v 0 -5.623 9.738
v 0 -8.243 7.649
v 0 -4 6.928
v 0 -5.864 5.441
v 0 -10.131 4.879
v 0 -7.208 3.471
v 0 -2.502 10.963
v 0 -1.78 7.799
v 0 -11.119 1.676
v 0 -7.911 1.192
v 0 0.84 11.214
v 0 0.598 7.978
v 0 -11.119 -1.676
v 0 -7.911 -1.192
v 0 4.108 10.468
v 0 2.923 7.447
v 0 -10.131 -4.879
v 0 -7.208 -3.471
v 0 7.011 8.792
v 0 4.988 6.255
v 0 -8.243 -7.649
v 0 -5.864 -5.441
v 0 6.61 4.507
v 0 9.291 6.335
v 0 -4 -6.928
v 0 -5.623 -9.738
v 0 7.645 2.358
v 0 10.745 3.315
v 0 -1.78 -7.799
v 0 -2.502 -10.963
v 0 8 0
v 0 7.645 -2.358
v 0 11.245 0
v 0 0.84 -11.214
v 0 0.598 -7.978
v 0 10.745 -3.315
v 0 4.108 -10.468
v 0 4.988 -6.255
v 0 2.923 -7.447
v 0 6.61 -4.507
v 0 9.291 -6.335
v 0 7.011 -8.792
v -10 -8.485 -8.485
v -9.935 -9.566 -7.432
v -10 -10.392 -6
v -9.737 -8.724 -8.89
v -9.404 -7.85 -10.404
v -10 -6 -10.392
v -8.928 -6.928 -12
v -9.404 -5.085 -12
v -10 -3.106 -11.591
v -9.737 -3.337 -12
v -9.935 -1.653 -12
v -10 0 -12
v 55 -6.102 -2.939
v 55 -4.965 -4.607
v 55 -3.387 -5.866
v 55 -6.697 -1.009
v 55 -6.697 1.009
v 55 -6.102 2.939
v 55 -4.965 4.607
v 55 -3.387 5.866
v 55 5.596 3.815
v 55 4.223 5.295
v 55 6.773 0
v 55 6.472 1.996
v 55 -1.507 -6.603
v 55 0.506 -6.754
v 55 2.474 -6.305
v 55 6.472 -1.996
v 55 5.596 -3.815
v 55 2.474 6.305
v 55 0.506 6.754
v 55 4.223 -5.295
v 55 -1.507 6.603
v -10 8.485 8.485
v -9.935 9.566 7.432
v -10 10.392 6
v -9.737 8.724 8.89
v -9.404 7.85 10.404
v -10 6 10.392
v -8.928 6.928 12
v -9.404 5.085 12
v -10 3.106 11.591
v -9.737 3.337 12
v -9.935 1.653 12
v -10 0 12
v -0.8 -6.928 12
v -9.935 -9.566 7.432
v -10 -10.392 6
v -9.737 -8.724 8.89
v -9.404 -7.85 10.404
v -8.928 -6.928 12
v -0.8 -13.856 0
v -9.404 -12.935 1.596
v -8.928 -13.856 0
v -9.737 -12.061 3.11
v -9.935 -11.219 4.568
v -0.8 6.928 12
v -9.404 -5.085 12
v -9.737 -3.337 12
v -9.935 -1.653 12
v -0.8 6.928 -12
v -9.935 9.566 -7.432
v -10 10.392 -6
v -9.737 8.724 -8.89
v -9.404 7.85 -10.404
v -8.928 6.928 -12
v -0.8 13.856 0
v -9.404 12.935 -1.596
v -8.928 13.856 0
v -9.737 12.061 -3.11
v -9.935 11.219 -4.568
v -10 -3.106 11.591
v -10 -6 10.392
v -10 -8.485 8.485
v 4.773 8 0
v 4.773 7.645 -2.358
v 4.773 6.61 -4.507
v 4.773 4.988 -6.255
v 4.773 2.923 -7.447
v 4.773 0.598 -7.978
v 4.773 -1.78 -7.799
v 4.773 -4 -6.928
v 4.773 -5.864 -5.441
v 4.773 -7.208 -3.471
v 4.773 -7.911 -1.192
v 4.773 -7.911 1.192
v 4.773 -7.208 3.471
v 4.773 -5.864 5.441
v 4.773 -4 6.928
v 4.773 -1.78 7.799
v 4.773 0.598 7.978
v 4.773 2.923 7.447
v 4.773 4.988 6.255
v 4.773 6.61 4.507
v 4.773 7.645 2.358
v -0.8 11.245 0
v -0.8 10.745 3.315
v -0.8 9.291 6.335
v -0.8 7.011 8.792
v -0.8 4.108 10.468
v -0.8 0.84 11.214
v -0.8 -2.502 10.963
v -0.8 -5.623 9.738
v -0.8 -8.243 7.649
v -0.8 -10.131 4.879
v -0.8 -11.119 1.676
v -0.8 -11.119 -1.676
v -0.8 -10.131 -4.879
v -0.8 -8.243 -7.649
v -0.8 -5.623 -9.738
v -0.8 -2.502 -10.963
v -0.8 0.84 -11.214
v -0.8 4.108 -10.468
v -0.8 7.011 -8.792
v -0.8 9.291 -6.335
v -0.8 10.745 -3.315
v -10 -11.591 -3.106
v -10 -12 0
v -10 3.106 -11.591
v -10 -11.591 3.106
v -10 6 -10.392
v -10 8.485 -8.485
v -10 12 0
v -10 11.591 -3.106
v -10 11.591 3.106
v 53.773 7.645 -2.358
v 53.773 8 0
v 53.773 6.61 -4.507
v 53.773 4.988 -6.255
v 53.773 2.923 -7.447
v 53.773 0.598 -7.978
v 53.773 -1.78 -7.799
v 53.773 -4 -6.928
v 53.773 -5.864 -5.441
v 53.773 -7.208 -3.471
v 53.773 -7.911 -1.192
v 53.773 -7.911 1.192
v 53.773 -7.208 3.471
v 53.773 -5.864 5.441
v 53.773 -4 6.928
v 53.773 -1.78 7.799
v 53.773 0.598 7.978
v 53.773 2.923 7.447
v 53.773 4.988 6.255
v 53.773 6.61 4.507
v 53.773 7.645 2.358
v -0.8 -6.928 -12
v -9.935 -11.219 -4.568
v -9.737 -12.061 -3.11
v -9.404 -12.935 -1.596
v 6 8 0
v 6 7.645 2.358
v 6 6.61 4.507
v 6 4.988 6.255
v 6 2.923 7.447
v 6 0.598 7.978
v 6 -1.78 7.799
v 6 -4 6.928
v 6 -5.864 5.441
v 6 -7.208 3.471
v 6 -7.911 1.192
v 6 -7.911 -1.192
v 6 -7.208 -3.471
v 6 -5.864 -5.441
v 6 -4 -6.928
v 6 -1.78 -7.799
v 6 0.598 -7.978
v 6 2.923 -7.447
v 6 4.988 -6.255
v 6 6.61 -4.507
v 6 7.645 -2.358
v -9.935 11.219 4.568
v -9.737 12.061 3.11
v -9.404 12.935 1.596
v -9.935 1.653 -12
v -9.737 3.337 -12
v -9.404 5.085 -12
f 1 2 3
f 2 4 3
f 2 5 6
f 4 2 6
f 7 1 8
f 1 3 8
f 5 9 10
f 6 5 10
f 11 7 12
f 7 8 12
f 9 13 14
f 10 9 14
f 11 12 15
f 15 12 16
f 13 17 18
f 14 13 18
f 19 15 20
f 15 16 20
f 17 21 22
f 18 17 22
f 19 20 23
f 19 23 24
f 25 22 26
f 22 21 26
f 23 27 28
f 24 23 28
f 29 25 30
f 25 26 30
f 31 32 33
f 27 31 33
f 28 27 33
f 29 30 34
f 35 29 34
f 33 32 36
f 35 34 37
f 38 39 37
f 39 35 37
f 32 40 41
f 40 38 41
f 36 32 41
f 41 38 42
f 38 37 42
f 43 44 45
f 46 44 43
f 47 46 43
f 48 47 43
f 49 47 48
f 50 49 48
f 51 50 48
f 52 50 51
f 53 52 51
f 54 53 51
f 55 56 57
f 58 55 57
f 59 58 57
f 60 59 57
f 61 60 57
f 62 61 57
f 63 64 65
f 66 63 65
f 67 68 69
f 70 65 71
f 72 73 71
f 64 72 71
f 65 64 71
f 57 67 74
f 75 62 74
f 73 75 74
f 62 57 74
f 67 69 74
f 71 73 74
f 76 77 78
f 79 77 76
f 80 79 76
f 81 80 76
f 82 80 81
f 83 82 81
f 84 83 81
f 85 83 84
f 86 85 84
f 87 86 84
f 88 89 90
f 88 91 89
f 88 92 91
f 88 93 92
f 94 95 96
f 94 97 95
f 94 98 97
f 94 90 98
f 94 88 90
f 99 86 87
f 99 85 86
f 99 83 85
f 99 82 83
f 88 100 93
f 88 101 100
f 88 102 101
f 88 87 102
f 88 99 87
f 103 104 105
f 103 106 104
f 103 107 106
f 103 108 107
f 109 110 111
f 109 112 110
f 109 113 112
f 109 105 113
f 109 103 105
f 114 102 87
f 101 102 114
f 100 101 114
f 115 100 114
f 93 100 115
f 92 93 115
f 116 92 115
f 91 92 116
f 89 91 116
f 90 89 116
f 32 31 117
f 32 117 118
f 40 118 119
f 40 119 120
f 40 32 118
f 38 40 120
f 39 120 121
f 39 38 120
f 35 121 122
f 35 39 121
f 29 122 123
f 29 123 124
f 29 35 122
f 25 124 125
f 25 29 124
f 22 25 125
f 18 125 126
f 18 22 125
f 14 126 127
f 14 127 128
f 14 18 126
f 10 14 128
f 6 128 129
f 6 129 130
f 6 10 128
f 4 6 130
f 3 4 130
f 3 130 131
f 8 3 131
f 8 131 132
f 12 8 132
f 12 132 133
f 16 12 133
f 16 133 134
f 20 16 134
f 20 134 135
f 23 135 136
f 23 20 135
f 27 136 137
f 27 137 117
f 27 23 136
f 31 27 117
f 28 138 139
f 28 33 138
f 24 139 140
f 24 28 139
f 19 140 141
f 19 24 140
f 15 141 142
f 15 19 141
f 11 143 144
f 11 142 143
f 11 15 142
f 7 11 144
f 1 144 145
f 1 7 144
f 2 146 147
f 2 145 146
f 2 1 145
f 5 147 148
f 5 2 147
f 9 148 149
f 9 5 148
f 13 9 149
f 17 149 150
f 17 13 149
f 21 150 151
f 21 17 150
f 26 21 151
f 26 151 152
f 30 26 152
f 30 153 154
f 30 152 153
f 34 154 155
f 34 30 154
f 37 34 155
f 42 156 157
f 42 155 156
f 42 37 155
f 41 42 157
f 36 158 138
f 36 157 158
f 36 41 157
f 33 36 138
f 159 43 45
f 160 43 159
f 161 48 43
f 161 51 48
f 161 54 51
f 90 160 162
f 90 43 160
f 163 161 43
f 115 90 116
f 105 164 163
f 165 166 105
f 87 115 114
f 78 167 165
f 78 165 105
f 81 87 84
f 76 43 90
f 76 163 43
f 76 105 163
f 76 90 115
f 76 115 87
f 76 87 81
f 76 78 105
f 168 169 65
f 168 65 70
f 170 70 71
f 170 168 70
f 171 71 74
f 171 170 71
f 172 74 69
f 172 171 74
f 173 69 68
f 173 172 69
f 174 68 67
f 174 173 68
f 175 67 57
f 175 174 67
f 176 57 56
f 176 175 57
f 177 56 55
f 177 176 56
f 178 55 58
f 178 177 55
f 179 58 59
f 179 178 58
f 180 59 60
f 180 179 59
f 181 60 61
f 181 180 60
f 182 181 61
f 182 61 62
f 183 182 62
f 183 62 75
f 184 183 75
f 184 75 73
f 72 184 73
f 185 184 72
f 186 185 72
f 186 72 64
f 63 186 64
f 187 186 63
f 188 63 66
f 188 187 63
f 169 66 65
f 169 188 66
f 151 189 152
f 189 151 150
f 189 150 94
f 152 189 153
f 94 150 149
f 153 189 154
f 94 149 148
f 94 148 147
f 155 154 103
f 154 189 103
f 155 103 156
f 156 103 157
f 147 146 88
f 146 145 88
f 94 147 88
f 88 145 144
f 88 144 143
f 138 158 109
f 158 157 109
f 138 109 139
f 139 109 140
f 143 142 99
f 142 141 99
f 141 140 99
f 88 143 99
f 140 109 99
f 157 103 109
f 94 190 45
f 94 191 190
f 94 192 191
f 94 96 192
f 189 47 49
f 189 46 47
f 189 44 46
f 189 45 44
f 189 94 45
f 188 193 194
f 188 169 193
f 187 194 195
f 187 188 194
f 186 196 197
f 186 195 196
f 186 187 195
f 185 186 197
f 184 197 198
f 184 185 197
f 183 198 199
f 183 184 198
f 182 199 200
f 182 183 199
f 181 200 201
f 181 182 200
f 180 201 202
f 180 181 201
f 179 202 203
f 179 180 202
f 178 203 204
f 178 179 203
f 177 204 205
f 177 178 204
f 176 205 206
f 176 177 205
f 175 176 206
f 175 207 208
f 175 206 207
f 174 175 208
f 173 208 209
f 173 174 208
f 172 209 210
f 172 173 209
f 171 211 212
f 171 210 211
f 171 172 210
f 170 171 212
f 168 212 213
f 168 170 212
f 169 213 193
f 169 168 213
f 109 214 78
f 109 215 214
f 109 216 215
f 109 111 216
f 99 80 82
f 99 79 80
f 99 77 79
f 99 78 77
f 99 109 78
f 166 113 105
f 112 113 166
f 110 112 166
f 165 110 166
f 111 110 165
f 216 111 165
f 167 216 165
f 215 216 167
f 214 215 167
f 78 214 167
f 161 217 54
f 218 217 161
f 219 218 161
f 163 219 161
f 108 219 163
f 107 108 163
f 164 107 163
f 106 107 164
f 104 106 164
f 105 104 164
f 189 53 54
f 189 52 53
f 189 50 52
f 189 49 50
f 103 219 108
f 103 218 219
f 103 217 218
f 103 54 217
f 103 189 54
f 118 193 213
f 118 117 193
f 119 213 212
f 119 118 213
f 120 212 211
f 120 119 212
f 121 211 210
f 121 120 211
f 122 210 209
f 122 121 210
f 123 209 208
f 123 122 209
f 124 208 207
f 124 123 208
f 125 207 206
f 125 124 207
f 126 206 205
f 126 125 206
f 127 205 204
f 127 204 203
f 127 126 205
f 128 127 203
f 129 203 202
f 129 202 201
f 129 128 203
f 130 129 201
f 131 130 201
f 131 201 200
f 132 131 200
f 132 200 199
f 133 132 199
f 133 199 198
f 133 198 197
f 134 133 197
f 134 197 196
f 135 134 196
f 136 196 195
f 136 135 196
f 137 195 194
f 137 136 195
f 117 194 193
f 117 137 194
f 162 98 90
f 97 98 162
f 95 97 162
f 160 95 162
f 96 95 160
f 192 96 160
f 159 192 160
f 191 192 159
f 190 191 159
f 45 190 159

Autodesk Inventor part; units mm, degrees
ref_plane "YZ Plane" through (0, 0, 0) normal (1, 0, 0) x (0, 1, 0)
ref_plane "XZ Plane" through (0, 0, 0) normal (0, 1, 0) x (-1, 0, 0)
sketch "Sketch1" plane through (0, 0, 0) normal (0, 0, 1) x (1, 0, 0)
  line L0 (0, 11.245) -> (0, 8)
  line L1 (6, 8) -> (55, 8)
  line L2 (55, 8) -> (55, 0)
  line L3 (55, 0) -> (-0.8001, 0)
  line L4 (-11.9601, 0) -> (66.16, 0) projected
  line L5 (-0.8001, 0) -> (-0.8001, 11.245)
  line L6 (-0.8001, 11.245) -> (0, 11.245)
  line L7 (6, 8) -> (4.773, 8)
  line L8 (4.773, 8) -> (0, 8)
  line L9 (0, -2.249) -> (0, 13.494) projected
  dimension "d0" = 55
  dimension "d1" = 49
  dimension "d2" = 16
  dimension "d9" = 0.8001
  dimension "d10" = 22.49
  dimension "d13" = 1.227
  dimension "d14" = 16
revolve "Body" add sketch "Sketch1" angle 360 about axis through (55, 0, 0) along (-1, 0, 0)
sketch "Sketch2" plane through (-0.8001, 0, 0) normal (-1, 0, 0) x (0, 0, 1)
  line L0 (0, 13.8564) -> (12, 6.9282)
  line L1 (12, 6.9282) -> (12, -6.9282)
  line L2 (12, -6.9282) -> (0, -13.8564)
  line L3 (0, -13.8564) -> (-12, -6.9282)
  line L4 (-12, -6.9282) -> (-12, 6.9282)
  line L5 (-12, 6.9282) -> (0, 13.8564)
  point P0 (0, 0)
  point P1 (0, 0)
  dimension "d11" = 24
extrude "Head" add sketch "Sketch2" along normal blind 9.2
sketch "Sketch4" plane through (0, 0, 0) normal (0, 0, 1) x (1, 0, 0)
  line L0 (-10.0001, 12) -> (-10.0001, 13.8564)
  line L1 (-10.0001, 13.8564) -> (-8.9283, 13.8564)
  line L2 (-8.9283, 13.8564) -> (-10.0001, 12)
  line L3 (-11.8401, 0) -> (1.0399, 0) projected
  line L4 (-0.8001, 13.8564) -> (-10.0001, 13.8564) projected
  line L5 (-10.0001, 6.9282) -> (-10.0001, 13.8564) projected
  dimension "d5" = 30
  dimension "d19" = 24
revolve "Chamfer1" cut sketch "Sketch4" angle 360 about axis through (-10, 0, 0) along (1, 0, 0)
thread "Thread" size "M16x2" class "6g" standard "ISO Metric profile" length 49
chamfer "Chamfer2" distance 1.2269 distance2 1.227 1 edges at (55, -8, 0) measured on face at (55, -1.996, 1.7683)
ref_plane "Work Plane1" through (1.525, 0, 0) normal (0, 0, 1) x (1, 0, 0)
equation "\"d0\" = NLG"
equation "\"d1\" = GEL"
equation "\"d2\" = GD"
equation "\"d10\" = SD2"
equation "\"d14\" = BDM"
equation "\"d11\" = SW"
equation "\"d3\" = KOH - SD"
equation "\"d5\" = ANG1"
equation "\"d19\" = SW0"
equation "\"d15\" = GEL"
equation "\"d6\" = -0.5 * SPD + 0.5 * GD"
equation "\"NLG\" = 55"
equation "\"GD\" = NND"
equation "\"BDM\" = NND"
equation "\"KOH\" = 10"
equation "\"GEL\" = 49"
equation "\"SW\" = 24"
equation "\"SW0\" = SW"
equation "\"SPD\" = NND - 1.2269 * PTC"
equation "\"SD2\" = 22.49"
equation "\"SD\" = 0.8"
equation "\"ANG1\" = 30deg"
equation "\"GAL\" = 0.61345 * PTC"
equation "\"GUL\" = 0.61345 * PTC"
equation "\"RR\" = 0.6"
equation "\"GD1\" = THREADDIA - 1.2269 * PTC"
equation "\"THREADDIA\" = 16"
equation "\"SDH\" = SD2"
equation "\"SDHG\" = 6"
equation "\"TOA\" = 30deg"
equation "\"PTC\" = 2"
equation "\"NND\" = 16"
equation "\"E0\" = 27.72"
properties part number "ISO 4017 - M16 x 55" material "Stainless Steel, 440C"
